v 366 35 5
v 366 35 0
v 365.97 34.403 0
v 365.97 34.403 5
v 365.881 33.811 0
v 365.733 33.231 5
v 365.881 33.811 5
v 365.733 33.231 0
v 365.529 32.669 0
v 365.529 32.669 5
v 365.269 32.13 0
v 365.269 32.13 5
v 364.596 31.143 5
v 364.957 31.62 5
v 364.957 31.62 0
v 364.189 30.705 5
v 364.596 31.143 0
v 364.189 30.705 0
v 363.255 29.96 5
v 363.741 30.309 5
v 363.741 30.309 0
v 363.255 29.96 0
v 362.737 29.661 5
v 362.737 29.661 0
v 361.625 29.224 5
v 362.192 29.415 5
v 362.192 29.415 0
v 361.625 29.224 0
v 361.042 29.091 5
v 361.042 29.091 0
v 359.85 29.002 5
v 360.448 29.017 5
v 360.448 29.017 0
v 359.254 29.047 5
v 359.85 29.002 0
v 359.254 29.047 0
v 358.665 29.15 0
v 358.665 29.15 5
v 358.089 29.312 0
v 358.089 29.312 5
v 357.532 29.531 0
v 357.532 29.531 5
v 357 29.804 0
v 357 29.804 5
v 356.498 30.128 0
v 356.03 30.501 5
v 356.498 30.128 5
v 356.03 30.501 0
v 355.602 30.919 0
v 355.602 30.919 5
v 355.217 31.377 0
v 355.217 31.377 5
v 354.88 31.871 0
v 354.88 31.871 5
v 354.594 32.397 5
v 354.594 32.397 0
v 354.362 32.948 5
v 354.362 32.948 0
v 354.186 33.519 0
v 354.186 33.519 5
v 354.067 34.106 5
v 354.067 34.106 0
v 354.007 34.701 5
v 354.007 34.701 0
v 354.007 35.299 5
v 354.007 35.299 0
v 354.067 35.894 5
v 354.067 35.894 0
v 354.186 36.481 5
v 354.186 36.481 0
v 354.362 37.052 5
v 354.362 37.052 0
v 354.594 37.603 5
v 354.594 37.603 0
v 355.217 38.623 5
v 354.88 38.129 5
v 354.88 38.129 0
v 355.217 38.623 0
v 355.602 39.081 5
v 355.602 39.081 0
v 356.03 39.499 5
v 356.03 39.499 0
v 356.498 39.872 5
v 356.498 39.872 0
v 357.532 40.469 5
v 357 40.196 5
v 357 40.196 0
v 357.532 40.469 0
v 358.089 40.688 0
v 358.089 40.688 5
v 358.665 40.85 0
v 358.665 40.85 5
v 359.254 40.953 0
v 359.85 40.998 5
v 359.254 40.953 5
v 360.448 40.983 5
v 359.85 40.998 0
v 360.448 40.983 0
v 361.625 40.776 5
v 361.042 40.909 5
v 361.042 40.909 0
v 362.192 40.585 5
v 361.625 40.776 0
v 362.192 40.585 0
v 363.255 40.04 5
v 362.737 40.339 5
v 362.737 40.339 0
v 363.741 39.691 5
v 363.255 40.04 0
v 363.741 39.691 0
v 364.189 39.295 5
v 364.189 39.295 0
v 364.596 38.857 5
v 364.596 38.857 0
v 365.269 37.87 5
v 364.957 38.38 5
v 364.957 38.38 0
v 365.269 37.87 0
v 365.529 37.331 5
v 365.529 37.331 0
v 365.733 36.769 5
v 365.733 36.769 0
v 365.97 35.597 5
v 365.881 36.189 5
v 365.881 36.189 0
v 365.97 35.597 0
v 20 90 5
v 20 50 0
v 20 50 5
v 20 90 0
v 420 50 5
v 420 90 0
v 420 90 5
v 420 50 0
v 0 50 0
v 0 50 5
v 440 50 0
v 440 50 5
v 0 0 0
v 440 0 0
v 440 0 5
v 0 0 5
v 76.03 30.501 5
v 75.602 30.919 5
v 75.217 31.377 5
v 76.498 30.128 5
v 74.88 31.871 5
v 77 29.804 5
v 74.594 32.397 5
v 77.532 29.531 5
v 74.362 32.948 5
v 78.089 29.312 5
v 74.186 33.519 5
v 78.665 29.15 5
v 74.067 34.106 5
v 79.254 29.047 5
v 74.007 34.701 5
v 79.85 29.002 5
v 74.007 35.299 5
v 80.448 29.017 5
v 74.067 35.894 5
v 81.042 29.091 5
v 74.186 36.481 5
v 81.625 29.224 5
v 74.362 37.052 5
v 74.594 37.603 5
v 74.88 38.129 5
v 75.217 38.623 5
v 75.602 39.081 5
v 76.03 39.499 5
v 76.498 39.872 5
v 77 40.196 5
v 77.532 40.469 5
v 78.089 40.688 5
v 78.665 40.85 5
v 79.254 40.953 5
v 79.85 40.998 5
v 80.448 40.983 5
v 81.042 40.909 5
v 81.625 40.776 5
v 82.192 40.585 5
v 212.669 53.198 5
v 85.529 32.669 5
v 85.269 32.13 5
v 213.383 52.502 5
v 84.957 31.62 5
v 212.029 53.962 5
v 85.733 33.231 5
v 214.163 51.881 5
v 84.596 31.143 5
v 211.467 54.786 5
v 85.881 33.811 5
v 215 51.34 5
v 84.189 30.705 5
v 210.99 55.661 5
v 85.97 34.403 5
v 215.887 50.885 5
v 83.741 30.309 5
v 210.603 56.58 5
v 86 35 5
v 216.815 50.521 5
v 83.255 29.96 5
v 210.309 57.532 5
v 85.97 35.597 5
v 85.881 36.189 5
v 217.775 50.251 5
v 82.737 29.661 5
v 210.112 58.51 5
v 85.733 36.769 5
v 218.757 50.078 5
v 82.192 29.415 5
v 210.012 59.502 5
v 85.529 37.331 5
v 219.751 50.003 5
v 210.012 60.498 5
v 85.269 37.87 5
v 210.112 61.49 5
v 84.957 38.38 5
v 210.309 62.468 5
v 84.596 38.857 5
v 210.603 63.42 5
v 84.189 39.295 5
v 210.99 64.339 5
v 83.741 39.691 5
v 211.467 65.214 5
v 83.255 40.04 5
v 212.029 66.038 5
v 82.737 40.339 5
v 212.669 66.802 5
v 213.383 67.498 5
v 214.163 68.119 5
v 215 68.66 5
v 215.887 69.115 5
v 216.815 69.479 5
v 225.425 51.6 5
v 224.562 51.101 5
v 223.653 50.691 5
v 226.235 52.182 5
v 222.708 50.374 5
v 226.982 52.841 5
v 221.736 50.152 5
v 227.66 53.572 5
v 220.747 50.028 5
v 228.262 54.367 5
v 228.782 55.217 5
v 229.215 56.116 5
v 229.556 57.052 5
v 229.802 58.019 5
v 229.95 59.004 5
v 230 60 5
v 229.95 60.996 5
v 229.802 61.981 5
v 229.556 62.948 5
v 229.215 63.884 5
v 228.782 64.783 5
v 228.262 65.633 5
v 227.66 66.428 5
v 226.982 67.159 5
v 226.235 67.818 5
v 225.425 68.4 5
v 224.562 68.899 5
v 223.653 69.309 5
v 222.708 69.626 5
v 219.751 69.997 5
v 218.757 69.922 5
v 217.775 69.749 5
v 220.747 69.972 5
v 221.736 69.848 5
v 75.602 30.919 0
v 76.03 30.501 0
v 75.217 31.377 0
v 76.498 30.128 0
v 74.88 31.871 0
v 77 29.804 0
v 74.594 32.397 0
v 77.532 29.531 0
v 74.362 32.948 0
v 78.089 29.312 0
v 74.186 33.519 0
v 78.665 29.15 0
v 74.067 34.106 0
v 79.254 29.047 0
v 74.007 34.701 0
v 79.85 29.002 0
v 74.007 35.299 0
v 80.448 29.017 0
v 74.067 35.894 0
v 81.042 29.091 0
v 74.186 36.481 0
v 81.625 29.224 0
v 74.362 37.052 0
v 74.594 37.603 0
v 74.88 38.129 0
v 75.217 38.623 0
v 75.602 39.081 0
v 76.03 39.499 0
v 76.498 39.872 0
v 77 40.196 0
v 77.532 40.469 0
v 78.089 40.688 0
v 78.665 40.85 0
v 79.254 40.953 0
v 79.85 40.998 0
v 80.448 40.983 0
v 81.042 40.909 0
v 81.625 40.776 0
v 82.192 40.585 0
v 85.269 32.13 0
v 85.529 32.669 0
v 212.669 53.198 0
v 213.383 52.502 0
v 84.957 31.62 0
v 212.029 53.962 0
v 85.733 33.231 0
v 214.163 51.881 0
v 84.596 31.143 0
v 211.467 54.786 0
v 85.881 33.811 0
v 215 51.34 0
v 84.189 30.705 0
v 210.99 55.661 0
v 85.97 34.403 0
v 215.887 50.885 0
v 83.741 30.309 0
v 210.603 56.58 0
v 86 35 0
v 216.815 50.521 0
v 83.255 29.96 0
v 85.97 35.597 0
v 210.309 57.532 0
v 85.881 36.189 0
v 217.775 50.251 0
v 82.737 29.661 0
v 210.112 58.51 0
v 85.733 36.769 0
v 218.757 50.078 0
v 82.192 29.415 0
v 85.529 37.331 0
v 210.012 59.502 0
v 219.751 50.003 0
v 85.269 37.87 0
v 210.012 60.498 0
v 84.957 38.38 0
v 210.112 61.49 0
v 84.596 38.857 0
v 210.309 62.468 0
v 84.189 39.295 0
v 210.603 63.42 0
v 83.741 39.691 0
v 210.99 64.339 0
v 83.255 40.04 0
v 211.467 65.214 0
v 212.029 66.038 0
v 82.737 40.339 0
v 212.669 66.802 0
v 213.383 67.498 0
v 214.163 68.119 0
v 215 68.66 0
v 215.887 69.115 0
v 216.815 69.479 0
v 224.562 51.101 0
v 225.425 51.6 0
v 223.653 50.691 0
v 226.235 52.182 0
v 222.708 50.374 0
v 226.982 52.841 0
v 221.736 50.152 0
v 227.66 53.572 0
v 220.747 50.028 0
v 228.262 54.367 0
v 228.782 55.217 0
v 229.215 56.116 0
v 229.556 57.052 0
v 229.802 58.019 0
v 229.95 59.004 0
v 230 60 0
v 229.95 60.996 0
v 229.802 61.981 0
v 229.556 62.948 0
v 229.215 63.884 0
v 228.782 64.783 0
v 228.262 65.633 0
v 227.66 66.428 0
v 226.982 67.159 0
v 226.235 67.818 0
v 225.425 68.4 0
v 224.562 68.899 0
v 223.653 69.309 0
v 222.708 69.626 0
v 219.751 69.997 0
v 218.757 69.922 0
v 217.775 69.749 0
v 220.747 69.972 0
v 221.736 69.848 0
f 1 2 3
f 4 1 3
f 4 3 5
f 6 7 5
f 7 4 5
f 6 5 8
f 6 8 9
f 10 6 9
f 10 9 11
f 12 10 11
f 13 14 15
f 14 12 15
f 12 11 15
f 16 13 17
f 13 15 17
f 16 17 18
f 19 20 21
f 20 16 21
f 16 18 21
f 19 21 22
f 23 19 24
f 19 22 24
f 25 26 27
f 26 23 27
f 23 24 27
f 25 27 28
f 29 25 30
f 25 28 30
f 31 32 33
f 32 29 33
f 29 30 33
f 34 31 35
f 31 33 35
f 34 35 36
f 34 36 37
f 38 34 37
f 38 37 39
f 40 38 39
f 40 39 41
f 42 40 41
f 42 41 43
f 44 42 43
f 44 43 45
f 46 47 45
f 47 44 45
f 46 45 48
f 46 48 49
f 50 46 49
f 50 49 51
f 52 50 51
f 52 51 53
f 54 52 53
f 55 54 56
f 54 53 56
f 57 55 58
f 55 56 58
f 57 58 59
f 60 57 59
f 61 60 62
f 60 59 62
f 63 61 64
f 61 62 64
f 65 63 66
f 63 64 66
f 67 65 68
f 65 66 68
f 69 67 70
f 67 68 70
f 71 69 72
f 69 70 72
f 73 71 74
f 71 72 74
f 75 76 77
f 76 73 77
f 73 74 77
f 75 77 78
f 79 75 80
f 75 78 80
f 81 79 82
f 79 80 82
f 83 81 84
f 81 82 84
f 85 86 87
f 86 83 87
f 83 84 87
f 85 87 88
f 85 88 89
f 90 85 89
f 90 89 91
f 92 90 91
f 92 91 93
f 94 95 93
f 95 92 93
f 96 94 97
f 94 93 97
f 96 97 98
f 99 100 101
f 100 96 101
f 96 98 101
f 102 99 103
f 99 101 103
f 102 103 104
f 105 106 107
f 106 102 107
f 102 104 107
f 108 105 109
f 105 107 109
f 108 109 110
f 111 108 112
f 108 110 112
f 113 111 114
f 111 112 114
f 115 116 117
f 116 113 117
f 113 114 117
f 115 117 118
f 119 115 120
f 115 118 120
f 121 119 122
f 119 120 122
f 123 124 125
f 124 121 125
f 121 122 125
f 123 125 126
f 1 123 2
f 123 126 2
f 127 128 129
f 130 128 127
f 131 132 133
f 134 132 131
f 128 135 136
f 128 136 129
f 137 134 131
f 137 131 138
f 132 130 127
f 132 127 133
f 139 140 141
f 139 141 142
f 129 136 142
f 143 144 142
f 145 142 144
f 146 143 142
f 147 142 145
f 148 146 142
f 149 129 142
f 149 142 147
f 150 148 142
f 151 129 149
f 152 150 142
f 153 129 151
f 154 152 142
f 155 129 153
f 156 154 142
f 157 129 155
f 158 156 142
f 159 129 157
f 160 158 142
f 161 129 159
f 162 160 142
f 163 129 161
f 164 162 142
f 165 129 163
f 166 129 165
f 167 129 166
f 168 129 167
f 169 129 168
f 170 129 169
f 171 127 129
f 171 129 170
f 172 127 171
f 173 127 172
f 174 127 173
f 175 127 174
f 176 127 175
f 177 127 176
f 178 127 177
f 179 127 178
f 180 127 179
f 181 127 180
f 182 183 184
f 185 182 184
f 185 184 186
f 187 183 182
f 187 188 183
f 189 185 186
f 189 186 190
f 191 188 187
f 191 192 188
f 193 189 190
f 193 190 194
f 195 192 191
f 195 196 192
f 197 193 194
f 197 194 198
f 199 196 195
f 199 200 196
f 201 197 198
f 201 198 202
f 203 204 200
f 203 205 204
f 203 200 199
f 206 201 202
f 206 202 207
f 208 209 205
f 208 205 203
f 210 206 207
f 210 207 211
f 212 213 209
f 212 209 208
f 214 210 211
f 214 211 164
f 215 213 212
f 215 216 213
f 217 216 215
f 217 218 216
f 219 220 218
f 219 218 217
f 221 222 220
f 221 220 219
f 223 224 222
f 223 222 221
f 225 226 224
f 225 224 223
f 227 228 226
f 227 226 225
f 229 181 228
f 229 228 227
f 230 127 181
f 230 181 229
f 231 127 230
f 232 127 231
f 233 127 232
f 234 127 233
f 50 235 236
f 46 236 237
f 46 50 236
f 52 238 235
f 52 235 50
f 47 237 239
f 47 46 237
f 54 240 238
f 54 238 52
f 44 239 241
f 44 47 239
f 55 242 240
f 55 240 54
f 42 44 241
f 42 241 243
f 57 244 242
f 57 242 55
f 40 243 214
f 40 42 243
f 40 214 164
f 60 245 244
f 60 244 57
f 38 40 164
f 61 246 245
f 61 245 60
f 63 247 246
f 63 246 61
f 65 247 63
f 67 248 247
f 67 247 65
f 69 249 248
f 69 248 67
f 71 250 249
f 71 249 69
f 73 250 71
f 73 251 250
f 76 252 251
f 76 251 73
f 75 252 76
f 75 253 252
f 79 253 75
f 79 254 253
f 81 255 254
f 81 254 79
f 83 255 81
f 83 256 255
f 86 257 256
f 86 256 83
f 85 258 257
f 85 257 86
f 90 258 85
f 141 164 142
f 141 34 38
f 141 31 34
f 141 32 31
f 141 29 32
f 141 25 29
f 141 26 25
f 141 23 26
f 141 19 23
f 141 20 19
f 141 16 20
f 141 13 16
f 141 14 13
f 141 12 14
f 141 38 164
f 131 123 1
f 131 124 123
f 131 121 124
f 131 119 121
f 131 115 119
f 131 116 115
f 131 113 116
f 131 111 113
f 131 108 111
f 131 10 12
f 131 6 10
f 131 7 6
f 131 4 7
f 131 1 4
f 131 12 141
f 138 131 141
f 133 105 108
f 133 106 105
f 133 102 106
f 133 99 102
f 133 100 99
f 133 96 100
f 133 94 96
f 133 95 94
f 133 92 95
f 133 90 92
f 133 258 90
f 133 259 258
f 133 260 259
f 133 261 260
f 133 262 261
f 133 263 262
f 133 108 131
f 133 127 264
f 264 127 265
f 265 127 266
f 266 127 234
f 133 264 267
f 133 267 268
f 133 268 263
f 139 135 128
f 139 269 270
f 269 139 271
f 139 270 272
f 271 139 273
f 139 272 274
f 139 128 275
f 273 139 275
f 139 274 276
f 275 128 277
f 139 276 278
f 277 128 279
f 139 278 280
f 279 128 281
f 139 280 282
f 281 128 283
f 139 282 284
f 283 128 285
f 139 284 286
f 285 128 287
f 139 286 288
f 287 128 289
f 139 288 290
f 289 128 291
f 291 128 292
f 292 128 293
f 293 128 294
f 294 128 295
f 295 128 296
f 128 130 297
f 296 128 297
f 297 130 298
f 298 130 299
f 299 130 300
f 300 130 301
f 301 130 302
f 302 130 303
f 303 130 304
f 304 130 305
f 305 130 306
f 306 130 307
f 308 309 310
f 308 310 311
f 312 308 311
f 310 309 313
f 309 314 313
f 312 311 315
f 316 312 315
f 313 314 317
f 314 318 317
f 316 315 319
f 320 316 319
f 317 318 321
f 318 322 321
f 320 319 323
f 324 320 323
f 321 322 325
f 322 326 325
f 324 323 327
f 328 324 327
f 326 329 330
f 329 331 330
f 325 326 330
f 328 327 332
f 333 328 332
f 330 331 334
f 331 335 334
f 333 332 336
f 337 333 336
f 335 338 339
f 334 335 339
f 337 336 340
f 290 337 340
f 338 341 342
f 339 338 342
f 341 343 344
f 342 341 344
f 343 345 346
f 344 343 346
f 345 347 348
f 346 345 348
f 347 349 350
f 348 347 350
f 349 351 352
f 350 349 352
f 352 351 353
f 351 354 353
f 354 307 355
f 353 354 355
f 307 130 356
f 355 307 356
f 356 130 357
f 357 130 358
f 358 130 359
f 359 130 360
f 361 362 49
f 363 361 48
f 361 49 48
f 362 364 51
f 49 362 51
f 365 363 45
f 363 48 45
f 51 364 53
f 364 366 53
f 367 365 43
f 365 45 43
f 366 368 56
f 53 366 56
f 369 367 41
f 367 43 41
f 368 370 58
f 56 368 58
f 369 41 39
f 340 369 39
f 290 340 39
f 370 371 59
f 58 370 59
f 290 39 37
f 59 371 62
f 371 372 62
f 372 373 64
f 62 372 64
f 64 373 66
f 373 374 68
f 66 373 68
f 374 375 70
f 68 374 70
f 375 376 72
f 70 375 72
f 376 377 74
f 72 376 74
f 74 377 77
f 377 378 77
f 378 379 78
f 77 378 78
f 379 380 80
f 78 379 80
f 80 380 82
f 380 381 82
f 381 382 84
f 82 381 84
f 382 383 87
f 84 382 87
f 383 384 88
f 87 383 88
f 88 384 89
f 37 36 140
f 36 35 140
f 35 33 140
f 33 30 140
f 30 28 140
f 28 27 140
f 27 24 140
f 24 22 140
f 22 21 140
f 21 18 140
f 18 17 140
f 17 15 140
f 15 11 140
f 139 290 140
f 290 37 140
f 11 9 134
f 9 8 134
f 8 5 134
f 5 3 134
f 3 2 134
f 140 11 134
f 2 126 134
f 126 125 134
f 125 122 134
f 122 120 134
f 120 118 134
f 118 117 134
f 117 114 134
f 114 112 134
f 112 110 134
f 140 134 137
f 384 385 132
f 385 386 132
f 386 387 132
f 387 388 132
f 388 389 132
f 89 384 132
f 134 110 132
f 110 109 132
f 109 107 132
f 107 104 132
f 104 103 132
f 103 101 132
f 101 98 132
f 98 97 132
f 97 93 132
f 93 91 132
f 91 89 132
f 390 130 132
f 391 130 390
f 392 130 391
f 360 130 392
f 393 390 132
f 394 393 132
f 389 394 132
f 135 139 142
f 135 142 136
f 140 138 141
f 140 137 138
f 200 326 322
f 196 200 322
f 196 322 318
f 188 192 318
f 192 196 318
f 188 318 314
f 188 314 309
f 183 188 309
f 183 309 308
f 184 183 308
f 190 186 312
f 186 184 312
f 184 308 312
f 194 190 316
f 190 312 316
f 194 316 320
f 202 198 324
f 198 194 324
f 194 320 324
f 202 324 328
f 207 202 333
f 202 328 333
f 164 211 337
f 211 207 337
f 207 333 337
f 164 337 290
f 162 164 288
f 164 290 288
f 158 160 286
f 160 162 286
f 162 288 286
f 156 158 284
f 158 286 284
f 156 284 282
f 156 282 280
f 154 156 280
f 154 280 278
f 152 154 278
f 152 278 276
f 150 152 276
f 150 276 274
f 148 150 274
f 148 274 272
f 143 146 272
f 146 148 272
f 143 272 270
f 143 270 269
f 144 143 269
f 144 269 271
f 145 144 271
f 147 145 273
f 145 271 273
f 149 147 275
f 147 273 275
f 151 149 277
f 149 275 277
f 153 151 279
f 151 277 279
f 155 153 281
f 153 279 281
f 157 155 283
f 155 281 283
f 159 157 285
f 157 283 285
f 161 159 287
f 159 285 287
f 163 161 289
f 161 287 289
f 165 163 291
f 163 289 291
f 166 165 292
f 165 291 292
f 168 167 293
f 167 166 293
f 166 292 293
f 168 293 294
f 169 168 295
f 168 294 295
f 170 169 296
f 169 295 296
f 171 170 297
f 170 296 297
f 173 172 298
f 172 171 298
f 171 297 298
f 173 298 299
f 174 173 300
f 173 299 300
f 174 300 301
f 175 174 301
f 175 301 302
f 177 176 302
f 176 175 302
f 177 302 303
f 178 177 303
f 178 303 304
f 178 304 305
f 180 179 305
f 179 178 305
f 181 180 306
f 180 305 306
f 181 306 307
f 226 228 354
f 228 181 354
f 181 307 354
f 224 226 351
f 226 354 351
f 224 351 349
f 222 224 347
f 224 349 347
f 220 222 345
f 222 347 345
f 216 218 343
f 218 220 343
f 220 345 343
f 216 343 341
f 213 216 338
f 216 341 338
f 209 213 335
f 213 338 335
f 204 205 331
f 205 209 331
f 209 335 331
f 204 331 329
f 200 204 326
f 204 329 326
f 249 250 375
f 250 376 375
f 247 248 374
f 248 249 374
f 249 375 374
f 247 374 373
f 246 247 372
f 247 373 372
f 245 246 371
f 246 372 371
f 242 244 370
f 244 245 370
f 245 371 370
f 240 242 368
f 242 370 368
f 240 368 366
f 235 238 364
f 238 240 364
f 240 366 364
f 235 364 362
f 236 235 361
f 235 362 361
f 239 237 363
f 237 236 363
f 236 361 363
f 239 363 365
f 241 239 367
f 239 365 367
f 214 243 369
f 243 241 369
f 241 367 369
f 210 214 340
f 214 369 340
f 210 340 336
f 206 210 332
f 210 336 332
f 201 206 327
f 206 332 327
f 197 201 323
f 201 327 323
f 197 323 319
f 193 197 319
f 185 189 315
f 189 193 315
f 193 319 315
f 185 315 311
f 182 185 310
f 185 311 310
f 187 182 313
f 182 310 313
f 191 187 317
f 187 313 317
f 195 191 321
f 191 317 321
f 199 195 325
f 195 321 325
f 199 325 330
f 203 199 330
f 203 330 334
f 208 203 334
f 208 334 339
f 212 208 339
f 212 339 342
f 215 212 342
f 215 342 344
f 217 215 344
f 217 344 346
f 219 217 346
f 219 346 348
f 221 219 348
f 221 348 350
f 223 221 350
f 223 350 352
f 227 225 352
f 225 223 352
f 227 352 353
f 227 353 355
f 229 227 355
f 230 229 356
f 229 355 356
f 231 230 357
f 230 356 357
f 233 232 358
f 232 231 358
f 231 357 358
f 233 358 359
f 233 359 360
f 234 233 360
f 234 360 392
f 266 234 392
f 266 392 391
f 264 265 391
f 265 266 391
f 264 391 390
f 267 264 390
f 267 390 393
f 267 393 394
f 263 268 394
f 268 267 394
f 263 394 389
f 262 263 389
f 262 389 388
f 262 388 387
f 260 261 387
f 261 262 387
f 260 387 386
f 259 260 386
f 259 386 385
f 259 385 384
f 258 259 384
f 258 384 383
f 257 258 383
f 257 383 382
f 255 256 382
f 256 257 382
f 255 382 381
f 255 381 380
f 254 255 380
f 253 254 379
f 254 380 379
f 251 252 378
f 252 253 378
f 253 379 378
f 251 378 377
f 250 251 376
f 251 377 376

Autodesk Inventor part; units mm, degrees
ref_plane "YZ Plane" through (0, 0, 0) normal (1, 0, 0) x (0, 1, 0)
ref_plane "XZ Plane" through (0, 0, 0) normal (0, 1, 0) x (-1, 0, 0)
ref_plane "XY Plane" through (0, 0, 0) normal (0, 0, 1) x (1, 0, 0)
sketch "Sketch1" plane through (0, 0, 0) normal (0, 0, 1) x (1, 0, 0)
  line L0 (0, 0) -> (0, 50)
  line L1 (0, 50) -> (20, 50)
  line L2 (20, 50) -> (20, 90)
  line L3 (20, 90) -> (420, 90)
  line L4 (420, 90) -> (420, 50)
  line L5 (420, 50) -> (440, 50)
  line L6 (440, 50) -> (440, 0)
  line L7 (440, 0) -> (0, 0)
  circle A0 centre (220, 60) radius 10
  circle A1 centre (80, 35) radius 6
  circle A2 centre (360, 35) radius 6
  circle A3 centre (80, 35) radius 50
  circle A4 centre (130, 35) radius 6
  circle A5 centre (310, 35) radius 6
  dimension "d1" = 50
  dimension "d2" = 20
  dimension "d3" = 40
  dimension "d4" = 400
  dimension "d5" = 40
  dimension "d6" = 20
  dimension "d7" = 20
  dimension "d8" = 12
  dimension "d9" = 12
  dimension "d10" = 80
  dimension "d11" = 80
  dimension "d12" = 35
  dimension "d13" = 35
  dimension "d14" = 30
  dimension "d17" = 100
  dimension "d18" = 12
  dimension "d19" = 12
  dimension "d20" = 130
  dimension "d21" = 130
  dimension "d22" = 35
  dimension "d23" = 35
extrude "Extrusion1" add sketch "Sketch1" along normal blind 5 contours L0 L1 L2 L3 L4 L5 L6 L7 A3 A4 | A3 A4 L7 | A4 A3 | A3 A4 | A5
properties part number "sUPORTE1"
